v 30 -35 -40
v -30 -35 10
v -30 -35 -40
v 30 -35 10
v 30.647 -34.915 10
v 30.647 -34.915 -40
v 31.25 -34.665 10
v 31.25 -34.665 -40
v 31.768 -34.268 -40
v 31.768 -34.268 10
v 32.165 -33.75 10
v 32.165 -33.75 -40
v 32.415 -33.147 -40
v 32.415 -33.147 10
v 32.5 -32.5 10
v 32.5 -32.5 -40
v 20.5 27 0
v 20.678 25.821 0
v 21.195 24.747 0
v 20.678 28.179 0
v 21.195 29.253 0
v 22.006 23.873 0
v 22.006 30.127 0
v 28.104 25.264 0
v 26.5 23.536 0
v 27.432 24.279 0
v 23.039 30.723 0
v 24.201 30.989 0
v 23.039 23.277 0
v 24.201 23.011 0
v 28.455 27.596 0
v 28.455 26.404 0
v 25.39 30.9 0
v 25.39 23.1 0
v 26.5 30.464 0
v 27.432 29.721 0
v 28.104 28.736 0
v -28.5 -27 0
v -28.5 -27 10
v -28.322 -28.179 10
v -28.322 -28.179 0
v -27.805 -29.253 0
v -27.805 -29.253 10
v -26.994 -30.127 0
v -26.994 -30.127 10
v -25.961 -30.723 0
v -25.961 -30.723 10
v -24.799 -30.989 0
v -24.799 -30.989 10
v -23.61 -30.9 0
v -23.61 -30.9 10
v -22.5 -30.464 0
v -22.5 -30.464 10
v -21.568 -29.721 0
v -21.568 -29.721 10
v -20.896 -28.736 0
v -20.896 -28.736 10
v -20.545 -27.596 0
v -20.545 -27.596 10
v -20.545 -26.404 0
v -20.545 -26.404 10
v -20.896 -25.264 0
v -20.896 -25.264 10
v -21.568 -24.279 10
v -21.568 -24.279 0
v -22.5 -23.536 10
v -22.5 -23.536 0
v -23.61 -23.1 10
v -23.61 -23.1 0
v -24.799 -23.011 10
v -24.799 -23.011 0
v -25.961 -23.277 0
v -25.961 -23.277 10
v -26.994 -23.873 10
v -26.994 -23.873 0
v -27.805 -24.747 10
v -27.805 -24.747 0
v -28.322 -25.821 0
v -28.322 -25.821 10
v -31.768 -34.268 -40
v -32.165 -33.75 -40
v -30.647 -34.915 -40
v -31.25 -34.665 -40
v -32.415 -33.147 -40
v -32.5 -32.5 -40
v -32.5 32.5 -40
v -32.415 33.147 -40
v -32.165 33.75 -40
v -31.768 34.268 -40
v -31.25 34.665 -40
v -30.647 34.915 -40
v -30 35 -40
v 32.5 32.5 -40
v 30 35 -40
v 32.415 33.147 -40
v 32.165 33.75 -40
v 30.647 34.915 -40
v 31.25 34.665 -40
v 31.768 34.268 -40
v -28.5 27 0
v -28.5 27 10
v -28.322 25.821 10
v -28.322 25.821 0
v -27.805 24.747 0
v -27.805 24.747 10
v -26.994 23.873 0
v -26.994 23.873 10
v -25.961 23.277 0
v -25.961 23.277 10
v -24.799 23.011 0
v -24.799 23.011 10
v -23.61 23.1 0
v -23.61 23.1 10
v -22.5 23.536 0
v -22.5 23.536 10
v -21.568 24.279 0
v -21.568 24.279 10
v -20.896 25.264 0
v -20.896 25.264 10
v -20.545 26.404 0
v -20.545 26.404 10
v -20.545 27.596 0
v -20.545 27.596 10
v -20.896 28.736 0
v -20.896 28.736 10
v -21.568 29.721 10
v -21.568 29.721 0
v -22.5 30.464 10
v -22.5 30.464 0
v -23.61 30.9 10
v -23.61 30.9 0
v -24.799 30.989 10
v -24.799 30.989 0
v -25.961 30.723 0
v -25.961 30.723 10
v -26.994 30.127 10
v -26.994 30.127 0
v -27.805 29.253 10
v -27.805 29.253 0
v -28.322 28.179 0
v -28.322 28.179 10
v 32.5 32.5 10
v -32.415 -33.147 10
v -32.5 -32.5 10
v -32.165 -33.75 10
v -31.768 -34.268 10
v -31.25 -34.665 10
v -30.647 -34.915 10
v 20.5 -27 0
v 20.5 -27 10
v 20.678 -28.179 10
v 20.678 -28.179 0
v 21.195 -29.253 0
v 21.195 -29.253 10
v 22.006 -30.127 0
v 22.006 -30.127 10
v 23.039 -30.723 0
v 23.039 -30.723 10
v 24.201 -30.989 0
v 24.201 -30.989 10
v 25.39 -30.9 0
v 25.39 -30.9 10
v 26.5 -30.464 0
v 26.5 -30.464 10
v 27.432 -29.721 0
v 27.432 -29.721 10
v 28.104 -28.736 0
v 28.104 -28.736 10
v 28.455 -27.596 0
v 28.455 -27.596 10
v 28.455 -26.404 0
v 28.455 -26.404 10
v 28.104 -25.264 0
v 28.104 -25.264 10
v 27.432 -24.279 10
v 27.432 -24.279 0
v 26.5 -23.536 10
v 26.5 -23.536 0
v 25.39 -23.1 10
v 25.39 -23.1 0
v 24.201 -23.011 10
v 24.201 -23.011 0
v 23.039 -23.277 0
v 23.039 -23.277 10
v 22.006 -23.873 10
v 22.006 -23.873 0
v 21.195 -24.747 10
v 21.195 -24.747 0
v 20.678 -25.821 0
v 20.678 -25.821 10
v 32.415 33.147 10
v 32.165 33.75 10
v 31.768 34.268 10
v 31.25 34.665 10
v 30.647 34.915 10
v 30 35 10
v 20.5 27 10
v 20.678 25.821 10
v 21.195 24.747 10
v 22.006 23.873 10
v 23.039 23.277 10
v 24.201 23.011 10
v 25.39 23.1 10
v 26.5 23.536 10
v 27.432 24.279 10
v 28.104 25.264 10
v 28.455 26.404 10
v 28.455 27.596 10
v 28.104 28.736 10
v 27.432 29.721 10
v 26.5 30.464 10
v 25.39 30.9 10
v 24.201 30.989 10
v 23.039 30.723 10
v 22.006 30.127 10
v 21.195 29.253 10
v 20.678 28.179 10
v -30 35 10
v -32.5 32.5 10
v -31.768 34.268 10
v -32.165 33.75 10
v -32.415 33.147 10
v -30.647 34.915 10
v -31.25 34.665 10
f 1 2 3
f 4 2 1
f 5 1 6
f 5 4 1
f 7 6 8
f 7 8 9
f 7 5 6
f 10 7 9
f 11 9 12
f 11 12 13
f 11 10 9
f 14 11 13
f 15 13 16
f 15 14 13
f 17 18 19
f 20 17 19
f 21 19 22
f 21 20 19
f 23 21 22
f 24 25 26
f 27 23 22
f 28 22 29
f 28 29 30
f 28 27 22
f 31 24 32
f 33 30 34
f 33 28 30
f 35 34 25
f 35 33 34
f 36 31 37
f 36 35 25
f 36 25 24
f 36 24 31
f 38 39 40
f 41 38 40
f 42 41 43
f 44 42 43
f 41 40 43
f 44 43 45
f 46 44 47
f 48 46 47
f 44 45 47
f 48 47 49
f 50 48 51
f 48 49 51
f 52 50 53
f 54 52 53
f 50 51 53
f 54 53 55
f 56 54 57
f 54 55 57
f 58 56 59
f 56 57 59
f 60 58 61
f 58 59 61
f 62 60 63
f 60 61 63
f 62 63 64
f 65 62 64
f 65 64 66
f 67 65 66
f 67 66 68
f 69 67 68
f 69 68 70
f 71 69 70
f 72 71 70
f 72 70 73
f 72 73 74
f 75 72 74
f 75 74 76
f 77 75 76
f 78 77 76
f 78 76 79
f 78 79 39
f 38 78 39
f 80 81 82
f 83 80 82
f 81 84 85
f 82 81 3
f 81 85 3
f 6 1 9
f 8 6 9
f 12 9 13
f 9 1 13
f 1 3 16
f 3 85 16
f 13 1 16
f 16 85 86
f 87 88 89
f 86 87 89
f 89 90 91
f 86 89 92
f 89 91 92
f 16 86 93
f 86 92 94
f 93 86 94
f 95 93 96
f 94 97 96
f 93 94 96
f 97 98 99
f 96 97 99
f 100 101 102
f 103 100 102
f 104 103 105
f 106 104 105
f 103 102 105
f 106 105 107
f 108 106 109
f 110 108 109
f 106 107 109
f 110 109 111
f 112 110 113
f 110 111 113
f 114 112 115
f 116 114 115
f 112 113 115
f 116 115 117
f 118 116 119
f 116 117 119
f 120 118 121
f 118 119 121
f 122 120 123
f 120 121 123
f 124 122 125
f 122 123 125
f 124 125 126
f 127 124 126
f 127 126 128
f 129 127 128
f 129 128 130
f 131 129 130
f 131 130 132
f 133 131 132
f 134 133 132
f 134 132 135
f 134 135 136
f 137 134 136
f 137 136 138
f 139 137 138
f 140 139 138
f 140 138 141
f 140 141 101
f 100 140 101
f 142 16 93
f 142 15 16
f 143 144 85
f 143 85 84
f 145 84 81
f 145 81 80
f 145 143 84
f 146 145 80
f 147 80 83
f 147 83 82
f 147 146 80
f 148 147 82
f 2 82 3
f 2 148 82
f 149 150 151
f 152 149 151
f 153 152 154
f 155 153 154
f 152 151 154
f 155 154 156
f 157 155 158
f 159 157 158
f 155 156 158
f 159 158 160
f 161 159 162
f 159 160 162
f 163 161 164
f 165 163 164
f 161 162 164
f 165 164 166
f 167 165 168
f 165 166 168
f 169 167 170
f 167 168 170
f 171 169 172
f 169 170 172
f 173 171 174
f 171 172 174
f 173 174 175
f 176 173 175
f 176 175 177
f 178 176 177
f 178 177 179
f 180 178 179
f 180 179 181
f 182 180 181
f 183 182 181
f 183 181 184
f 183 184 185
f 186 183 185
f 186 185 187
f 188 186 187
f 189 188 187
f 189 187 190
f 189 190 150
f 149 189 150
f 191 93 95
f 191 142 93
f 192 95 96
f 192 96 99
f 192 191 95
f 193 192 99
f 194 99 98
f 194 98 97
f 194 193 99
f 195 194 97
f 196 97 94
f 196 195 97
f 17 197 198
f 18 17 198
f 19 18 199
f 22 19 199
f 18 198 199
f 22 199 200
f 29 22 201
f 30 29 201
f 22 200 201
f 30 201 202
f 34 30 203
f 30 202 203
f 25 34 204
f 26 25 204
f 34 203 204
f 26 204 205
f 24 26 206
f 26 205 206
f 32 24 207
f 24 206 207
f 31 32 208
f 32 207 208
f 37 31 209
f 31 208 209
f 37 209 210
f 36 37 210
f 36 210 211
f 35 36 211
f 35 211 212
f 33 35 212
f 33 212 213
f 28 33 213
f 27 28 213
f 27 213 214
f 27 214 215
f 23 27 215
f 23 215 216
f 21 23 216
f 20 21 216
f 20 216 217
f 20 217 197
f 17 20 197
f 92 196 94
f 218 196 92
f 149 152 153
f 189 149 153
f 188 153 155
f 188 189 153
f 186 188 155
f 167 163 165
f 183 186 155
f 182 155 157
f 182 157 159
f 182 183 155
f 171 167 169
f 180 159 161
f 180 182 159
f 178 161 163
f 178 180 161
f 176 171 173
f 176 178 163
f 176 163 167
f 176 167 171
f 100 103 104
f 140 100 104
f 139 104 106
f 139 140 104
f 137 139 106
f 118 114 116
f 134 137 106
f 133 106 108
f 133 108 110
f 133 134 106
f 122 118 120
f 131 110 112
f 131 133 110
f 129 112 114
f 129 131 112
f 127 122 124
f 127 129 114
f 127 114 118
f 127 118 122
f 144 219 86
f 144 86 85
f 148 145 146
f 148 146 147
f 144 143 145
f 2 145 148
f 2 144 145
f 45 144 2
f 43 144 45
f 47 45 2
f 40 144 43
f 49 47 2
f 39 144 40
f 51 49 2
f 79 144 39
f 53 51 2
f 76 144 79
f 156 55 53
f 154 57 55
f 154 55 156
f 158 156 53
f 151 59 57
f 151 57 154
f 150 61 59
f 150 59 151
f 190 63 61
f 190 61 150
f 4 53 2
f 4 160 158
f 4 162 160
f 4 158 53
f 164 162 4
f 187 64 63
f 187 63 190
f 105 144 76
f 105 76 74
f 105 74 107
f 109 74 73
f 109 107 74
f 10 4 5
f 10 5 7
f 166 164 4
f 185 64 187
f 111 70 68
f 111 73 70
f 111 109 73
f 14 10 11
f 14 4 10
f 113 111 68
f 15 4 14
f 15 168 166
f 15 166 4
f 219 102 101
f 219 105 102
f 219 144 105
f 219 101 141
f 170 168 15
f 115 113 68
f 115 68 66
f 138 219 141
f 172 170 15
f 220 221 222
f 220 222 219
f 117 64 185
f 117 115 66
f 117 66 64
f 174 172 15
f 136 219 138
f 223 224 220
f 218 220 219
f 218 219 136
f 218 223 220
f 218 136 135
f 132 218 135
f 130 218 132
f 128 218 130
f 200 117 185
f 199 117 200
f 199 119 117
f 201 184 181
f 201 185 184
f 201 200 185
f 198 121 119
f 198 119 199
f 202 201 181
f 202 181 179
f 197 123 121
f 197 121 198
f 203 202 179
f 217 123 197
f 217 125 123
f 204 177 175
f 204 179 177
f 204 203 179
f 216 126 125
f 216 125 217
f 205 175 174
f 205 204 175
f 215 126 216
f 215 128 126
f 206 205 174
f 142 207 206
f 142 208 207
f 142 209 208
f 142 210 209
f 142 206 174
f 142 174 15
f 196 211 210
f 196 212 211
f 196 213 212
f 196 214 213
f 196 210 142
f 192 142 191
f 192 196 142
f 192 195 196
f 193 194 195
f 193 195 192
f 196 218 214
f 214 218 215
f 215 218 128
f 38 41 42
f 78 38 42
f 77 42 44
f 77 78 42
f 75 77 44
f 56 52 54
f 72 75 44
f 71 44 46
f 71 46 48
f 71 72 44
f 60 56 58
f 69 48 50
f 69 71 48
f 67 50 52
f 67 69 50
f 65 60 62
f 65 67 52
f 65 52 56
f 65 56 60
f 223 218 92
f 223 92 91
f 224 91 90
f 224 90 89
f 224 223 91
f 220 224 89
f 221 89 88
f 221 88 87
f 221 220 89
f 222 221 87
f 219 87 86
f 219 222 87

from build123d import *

# Parameters (mm, degrees)
F1_DEPTH = 10
F2_D     = 8
F3_D     = 8
F4_D     = 8
F5_D     = 8
F6_W     = 30
F6_H     = 66.012212
F7_DEPTH = 40


with BuildPart() as f1:
    # F0 (on Top) → F1 (new body)
    with BuildSketch(Plane.XY):
        with BuildLine():
            Line((30, 35), (-30, 35))
            ThreePointArc((-30, 35), (-31.767767, 34.267767), (-32.5, 32.5))
            Line((-32.5, 32.5), (-32.5, -32.5))
            ThreePointArc((-32.5, -32.5), (-31.767767, -34.267767), (-30, -35))
            Line((-30, -35), (30, -35))
            ThreePointArc((30, -35), (31.767767, -34.267767), (32.5, -32.5))
            Line((32.5, -32.5), (32.5, 32.5))
            ThreePointArc((32.5, 32.5), (31.767767, 34.267767), (30, 35))
        make_face()
    extrude(amount=F1_DEPTH)

    # F2 (through all)
    with Locations(Plane(origin=(0, 0, 0), x_dir=(1, 0, 0), z_dir=(0, 0, -1))):
        with Locations((24.5, 27)):
            Hole(F2_D / 2)

    # F3 (through all)
    with Locations(Plane(origin=(0, 0, 0), x_dir=(1, 0, 0), z_dir=(0, 0, -1))):
        with Locations((-24.5, 27)):
            Hole(F3_D / 2)

    # F4 (through all)
    with Locations(Plane(origin=(0, 0, 0), x_dir=(1, 0, 0), z_dir=(0, 0, -1))):
        with Locations((24.5, -27)):
            Hole(F4_D / 2)

    # F5 (through all)
    with Locations(Plane(origin=(0, 0, 0), x_dir=(1, 0, 0), z_dir=(0, 0, -1))):
        with Locations((-24.5, -27)):
            Hole(F5_D / 2)

    # F6 (on Top) + F0 (on Top) → F7 (join)
    with BuildSketch(Plane.XY):
        Rectangle(F6_W, F6_H)
    with BuildSketch(Plane.XY):
        with BuildLine():
            Line((30, 35), (-30, 35))
            ThreePointArc((-30, 35), (-31.767767, 34.267767), (-32.5, 32.5))
            Line((-32.5, 32.5), (-32.5, -32.5))
            ThreePointArc((-32.5, -32.5), (-31.767767, -34.267767), (-30, -35))
            Line((-30, -35), (30, -35))
            ThreePointArc((30, -35), (31.767767, -34.267767), (32.5, -32.5))
            Line((32.5, -32.5), (32.5, 32.5))
            ThreePointArc((32.5, 32.5), (31.767767, 34.267767), (30, 35))
        make_face()
    extrude(amount=-F7_DEPTH)


solid = f1.part
